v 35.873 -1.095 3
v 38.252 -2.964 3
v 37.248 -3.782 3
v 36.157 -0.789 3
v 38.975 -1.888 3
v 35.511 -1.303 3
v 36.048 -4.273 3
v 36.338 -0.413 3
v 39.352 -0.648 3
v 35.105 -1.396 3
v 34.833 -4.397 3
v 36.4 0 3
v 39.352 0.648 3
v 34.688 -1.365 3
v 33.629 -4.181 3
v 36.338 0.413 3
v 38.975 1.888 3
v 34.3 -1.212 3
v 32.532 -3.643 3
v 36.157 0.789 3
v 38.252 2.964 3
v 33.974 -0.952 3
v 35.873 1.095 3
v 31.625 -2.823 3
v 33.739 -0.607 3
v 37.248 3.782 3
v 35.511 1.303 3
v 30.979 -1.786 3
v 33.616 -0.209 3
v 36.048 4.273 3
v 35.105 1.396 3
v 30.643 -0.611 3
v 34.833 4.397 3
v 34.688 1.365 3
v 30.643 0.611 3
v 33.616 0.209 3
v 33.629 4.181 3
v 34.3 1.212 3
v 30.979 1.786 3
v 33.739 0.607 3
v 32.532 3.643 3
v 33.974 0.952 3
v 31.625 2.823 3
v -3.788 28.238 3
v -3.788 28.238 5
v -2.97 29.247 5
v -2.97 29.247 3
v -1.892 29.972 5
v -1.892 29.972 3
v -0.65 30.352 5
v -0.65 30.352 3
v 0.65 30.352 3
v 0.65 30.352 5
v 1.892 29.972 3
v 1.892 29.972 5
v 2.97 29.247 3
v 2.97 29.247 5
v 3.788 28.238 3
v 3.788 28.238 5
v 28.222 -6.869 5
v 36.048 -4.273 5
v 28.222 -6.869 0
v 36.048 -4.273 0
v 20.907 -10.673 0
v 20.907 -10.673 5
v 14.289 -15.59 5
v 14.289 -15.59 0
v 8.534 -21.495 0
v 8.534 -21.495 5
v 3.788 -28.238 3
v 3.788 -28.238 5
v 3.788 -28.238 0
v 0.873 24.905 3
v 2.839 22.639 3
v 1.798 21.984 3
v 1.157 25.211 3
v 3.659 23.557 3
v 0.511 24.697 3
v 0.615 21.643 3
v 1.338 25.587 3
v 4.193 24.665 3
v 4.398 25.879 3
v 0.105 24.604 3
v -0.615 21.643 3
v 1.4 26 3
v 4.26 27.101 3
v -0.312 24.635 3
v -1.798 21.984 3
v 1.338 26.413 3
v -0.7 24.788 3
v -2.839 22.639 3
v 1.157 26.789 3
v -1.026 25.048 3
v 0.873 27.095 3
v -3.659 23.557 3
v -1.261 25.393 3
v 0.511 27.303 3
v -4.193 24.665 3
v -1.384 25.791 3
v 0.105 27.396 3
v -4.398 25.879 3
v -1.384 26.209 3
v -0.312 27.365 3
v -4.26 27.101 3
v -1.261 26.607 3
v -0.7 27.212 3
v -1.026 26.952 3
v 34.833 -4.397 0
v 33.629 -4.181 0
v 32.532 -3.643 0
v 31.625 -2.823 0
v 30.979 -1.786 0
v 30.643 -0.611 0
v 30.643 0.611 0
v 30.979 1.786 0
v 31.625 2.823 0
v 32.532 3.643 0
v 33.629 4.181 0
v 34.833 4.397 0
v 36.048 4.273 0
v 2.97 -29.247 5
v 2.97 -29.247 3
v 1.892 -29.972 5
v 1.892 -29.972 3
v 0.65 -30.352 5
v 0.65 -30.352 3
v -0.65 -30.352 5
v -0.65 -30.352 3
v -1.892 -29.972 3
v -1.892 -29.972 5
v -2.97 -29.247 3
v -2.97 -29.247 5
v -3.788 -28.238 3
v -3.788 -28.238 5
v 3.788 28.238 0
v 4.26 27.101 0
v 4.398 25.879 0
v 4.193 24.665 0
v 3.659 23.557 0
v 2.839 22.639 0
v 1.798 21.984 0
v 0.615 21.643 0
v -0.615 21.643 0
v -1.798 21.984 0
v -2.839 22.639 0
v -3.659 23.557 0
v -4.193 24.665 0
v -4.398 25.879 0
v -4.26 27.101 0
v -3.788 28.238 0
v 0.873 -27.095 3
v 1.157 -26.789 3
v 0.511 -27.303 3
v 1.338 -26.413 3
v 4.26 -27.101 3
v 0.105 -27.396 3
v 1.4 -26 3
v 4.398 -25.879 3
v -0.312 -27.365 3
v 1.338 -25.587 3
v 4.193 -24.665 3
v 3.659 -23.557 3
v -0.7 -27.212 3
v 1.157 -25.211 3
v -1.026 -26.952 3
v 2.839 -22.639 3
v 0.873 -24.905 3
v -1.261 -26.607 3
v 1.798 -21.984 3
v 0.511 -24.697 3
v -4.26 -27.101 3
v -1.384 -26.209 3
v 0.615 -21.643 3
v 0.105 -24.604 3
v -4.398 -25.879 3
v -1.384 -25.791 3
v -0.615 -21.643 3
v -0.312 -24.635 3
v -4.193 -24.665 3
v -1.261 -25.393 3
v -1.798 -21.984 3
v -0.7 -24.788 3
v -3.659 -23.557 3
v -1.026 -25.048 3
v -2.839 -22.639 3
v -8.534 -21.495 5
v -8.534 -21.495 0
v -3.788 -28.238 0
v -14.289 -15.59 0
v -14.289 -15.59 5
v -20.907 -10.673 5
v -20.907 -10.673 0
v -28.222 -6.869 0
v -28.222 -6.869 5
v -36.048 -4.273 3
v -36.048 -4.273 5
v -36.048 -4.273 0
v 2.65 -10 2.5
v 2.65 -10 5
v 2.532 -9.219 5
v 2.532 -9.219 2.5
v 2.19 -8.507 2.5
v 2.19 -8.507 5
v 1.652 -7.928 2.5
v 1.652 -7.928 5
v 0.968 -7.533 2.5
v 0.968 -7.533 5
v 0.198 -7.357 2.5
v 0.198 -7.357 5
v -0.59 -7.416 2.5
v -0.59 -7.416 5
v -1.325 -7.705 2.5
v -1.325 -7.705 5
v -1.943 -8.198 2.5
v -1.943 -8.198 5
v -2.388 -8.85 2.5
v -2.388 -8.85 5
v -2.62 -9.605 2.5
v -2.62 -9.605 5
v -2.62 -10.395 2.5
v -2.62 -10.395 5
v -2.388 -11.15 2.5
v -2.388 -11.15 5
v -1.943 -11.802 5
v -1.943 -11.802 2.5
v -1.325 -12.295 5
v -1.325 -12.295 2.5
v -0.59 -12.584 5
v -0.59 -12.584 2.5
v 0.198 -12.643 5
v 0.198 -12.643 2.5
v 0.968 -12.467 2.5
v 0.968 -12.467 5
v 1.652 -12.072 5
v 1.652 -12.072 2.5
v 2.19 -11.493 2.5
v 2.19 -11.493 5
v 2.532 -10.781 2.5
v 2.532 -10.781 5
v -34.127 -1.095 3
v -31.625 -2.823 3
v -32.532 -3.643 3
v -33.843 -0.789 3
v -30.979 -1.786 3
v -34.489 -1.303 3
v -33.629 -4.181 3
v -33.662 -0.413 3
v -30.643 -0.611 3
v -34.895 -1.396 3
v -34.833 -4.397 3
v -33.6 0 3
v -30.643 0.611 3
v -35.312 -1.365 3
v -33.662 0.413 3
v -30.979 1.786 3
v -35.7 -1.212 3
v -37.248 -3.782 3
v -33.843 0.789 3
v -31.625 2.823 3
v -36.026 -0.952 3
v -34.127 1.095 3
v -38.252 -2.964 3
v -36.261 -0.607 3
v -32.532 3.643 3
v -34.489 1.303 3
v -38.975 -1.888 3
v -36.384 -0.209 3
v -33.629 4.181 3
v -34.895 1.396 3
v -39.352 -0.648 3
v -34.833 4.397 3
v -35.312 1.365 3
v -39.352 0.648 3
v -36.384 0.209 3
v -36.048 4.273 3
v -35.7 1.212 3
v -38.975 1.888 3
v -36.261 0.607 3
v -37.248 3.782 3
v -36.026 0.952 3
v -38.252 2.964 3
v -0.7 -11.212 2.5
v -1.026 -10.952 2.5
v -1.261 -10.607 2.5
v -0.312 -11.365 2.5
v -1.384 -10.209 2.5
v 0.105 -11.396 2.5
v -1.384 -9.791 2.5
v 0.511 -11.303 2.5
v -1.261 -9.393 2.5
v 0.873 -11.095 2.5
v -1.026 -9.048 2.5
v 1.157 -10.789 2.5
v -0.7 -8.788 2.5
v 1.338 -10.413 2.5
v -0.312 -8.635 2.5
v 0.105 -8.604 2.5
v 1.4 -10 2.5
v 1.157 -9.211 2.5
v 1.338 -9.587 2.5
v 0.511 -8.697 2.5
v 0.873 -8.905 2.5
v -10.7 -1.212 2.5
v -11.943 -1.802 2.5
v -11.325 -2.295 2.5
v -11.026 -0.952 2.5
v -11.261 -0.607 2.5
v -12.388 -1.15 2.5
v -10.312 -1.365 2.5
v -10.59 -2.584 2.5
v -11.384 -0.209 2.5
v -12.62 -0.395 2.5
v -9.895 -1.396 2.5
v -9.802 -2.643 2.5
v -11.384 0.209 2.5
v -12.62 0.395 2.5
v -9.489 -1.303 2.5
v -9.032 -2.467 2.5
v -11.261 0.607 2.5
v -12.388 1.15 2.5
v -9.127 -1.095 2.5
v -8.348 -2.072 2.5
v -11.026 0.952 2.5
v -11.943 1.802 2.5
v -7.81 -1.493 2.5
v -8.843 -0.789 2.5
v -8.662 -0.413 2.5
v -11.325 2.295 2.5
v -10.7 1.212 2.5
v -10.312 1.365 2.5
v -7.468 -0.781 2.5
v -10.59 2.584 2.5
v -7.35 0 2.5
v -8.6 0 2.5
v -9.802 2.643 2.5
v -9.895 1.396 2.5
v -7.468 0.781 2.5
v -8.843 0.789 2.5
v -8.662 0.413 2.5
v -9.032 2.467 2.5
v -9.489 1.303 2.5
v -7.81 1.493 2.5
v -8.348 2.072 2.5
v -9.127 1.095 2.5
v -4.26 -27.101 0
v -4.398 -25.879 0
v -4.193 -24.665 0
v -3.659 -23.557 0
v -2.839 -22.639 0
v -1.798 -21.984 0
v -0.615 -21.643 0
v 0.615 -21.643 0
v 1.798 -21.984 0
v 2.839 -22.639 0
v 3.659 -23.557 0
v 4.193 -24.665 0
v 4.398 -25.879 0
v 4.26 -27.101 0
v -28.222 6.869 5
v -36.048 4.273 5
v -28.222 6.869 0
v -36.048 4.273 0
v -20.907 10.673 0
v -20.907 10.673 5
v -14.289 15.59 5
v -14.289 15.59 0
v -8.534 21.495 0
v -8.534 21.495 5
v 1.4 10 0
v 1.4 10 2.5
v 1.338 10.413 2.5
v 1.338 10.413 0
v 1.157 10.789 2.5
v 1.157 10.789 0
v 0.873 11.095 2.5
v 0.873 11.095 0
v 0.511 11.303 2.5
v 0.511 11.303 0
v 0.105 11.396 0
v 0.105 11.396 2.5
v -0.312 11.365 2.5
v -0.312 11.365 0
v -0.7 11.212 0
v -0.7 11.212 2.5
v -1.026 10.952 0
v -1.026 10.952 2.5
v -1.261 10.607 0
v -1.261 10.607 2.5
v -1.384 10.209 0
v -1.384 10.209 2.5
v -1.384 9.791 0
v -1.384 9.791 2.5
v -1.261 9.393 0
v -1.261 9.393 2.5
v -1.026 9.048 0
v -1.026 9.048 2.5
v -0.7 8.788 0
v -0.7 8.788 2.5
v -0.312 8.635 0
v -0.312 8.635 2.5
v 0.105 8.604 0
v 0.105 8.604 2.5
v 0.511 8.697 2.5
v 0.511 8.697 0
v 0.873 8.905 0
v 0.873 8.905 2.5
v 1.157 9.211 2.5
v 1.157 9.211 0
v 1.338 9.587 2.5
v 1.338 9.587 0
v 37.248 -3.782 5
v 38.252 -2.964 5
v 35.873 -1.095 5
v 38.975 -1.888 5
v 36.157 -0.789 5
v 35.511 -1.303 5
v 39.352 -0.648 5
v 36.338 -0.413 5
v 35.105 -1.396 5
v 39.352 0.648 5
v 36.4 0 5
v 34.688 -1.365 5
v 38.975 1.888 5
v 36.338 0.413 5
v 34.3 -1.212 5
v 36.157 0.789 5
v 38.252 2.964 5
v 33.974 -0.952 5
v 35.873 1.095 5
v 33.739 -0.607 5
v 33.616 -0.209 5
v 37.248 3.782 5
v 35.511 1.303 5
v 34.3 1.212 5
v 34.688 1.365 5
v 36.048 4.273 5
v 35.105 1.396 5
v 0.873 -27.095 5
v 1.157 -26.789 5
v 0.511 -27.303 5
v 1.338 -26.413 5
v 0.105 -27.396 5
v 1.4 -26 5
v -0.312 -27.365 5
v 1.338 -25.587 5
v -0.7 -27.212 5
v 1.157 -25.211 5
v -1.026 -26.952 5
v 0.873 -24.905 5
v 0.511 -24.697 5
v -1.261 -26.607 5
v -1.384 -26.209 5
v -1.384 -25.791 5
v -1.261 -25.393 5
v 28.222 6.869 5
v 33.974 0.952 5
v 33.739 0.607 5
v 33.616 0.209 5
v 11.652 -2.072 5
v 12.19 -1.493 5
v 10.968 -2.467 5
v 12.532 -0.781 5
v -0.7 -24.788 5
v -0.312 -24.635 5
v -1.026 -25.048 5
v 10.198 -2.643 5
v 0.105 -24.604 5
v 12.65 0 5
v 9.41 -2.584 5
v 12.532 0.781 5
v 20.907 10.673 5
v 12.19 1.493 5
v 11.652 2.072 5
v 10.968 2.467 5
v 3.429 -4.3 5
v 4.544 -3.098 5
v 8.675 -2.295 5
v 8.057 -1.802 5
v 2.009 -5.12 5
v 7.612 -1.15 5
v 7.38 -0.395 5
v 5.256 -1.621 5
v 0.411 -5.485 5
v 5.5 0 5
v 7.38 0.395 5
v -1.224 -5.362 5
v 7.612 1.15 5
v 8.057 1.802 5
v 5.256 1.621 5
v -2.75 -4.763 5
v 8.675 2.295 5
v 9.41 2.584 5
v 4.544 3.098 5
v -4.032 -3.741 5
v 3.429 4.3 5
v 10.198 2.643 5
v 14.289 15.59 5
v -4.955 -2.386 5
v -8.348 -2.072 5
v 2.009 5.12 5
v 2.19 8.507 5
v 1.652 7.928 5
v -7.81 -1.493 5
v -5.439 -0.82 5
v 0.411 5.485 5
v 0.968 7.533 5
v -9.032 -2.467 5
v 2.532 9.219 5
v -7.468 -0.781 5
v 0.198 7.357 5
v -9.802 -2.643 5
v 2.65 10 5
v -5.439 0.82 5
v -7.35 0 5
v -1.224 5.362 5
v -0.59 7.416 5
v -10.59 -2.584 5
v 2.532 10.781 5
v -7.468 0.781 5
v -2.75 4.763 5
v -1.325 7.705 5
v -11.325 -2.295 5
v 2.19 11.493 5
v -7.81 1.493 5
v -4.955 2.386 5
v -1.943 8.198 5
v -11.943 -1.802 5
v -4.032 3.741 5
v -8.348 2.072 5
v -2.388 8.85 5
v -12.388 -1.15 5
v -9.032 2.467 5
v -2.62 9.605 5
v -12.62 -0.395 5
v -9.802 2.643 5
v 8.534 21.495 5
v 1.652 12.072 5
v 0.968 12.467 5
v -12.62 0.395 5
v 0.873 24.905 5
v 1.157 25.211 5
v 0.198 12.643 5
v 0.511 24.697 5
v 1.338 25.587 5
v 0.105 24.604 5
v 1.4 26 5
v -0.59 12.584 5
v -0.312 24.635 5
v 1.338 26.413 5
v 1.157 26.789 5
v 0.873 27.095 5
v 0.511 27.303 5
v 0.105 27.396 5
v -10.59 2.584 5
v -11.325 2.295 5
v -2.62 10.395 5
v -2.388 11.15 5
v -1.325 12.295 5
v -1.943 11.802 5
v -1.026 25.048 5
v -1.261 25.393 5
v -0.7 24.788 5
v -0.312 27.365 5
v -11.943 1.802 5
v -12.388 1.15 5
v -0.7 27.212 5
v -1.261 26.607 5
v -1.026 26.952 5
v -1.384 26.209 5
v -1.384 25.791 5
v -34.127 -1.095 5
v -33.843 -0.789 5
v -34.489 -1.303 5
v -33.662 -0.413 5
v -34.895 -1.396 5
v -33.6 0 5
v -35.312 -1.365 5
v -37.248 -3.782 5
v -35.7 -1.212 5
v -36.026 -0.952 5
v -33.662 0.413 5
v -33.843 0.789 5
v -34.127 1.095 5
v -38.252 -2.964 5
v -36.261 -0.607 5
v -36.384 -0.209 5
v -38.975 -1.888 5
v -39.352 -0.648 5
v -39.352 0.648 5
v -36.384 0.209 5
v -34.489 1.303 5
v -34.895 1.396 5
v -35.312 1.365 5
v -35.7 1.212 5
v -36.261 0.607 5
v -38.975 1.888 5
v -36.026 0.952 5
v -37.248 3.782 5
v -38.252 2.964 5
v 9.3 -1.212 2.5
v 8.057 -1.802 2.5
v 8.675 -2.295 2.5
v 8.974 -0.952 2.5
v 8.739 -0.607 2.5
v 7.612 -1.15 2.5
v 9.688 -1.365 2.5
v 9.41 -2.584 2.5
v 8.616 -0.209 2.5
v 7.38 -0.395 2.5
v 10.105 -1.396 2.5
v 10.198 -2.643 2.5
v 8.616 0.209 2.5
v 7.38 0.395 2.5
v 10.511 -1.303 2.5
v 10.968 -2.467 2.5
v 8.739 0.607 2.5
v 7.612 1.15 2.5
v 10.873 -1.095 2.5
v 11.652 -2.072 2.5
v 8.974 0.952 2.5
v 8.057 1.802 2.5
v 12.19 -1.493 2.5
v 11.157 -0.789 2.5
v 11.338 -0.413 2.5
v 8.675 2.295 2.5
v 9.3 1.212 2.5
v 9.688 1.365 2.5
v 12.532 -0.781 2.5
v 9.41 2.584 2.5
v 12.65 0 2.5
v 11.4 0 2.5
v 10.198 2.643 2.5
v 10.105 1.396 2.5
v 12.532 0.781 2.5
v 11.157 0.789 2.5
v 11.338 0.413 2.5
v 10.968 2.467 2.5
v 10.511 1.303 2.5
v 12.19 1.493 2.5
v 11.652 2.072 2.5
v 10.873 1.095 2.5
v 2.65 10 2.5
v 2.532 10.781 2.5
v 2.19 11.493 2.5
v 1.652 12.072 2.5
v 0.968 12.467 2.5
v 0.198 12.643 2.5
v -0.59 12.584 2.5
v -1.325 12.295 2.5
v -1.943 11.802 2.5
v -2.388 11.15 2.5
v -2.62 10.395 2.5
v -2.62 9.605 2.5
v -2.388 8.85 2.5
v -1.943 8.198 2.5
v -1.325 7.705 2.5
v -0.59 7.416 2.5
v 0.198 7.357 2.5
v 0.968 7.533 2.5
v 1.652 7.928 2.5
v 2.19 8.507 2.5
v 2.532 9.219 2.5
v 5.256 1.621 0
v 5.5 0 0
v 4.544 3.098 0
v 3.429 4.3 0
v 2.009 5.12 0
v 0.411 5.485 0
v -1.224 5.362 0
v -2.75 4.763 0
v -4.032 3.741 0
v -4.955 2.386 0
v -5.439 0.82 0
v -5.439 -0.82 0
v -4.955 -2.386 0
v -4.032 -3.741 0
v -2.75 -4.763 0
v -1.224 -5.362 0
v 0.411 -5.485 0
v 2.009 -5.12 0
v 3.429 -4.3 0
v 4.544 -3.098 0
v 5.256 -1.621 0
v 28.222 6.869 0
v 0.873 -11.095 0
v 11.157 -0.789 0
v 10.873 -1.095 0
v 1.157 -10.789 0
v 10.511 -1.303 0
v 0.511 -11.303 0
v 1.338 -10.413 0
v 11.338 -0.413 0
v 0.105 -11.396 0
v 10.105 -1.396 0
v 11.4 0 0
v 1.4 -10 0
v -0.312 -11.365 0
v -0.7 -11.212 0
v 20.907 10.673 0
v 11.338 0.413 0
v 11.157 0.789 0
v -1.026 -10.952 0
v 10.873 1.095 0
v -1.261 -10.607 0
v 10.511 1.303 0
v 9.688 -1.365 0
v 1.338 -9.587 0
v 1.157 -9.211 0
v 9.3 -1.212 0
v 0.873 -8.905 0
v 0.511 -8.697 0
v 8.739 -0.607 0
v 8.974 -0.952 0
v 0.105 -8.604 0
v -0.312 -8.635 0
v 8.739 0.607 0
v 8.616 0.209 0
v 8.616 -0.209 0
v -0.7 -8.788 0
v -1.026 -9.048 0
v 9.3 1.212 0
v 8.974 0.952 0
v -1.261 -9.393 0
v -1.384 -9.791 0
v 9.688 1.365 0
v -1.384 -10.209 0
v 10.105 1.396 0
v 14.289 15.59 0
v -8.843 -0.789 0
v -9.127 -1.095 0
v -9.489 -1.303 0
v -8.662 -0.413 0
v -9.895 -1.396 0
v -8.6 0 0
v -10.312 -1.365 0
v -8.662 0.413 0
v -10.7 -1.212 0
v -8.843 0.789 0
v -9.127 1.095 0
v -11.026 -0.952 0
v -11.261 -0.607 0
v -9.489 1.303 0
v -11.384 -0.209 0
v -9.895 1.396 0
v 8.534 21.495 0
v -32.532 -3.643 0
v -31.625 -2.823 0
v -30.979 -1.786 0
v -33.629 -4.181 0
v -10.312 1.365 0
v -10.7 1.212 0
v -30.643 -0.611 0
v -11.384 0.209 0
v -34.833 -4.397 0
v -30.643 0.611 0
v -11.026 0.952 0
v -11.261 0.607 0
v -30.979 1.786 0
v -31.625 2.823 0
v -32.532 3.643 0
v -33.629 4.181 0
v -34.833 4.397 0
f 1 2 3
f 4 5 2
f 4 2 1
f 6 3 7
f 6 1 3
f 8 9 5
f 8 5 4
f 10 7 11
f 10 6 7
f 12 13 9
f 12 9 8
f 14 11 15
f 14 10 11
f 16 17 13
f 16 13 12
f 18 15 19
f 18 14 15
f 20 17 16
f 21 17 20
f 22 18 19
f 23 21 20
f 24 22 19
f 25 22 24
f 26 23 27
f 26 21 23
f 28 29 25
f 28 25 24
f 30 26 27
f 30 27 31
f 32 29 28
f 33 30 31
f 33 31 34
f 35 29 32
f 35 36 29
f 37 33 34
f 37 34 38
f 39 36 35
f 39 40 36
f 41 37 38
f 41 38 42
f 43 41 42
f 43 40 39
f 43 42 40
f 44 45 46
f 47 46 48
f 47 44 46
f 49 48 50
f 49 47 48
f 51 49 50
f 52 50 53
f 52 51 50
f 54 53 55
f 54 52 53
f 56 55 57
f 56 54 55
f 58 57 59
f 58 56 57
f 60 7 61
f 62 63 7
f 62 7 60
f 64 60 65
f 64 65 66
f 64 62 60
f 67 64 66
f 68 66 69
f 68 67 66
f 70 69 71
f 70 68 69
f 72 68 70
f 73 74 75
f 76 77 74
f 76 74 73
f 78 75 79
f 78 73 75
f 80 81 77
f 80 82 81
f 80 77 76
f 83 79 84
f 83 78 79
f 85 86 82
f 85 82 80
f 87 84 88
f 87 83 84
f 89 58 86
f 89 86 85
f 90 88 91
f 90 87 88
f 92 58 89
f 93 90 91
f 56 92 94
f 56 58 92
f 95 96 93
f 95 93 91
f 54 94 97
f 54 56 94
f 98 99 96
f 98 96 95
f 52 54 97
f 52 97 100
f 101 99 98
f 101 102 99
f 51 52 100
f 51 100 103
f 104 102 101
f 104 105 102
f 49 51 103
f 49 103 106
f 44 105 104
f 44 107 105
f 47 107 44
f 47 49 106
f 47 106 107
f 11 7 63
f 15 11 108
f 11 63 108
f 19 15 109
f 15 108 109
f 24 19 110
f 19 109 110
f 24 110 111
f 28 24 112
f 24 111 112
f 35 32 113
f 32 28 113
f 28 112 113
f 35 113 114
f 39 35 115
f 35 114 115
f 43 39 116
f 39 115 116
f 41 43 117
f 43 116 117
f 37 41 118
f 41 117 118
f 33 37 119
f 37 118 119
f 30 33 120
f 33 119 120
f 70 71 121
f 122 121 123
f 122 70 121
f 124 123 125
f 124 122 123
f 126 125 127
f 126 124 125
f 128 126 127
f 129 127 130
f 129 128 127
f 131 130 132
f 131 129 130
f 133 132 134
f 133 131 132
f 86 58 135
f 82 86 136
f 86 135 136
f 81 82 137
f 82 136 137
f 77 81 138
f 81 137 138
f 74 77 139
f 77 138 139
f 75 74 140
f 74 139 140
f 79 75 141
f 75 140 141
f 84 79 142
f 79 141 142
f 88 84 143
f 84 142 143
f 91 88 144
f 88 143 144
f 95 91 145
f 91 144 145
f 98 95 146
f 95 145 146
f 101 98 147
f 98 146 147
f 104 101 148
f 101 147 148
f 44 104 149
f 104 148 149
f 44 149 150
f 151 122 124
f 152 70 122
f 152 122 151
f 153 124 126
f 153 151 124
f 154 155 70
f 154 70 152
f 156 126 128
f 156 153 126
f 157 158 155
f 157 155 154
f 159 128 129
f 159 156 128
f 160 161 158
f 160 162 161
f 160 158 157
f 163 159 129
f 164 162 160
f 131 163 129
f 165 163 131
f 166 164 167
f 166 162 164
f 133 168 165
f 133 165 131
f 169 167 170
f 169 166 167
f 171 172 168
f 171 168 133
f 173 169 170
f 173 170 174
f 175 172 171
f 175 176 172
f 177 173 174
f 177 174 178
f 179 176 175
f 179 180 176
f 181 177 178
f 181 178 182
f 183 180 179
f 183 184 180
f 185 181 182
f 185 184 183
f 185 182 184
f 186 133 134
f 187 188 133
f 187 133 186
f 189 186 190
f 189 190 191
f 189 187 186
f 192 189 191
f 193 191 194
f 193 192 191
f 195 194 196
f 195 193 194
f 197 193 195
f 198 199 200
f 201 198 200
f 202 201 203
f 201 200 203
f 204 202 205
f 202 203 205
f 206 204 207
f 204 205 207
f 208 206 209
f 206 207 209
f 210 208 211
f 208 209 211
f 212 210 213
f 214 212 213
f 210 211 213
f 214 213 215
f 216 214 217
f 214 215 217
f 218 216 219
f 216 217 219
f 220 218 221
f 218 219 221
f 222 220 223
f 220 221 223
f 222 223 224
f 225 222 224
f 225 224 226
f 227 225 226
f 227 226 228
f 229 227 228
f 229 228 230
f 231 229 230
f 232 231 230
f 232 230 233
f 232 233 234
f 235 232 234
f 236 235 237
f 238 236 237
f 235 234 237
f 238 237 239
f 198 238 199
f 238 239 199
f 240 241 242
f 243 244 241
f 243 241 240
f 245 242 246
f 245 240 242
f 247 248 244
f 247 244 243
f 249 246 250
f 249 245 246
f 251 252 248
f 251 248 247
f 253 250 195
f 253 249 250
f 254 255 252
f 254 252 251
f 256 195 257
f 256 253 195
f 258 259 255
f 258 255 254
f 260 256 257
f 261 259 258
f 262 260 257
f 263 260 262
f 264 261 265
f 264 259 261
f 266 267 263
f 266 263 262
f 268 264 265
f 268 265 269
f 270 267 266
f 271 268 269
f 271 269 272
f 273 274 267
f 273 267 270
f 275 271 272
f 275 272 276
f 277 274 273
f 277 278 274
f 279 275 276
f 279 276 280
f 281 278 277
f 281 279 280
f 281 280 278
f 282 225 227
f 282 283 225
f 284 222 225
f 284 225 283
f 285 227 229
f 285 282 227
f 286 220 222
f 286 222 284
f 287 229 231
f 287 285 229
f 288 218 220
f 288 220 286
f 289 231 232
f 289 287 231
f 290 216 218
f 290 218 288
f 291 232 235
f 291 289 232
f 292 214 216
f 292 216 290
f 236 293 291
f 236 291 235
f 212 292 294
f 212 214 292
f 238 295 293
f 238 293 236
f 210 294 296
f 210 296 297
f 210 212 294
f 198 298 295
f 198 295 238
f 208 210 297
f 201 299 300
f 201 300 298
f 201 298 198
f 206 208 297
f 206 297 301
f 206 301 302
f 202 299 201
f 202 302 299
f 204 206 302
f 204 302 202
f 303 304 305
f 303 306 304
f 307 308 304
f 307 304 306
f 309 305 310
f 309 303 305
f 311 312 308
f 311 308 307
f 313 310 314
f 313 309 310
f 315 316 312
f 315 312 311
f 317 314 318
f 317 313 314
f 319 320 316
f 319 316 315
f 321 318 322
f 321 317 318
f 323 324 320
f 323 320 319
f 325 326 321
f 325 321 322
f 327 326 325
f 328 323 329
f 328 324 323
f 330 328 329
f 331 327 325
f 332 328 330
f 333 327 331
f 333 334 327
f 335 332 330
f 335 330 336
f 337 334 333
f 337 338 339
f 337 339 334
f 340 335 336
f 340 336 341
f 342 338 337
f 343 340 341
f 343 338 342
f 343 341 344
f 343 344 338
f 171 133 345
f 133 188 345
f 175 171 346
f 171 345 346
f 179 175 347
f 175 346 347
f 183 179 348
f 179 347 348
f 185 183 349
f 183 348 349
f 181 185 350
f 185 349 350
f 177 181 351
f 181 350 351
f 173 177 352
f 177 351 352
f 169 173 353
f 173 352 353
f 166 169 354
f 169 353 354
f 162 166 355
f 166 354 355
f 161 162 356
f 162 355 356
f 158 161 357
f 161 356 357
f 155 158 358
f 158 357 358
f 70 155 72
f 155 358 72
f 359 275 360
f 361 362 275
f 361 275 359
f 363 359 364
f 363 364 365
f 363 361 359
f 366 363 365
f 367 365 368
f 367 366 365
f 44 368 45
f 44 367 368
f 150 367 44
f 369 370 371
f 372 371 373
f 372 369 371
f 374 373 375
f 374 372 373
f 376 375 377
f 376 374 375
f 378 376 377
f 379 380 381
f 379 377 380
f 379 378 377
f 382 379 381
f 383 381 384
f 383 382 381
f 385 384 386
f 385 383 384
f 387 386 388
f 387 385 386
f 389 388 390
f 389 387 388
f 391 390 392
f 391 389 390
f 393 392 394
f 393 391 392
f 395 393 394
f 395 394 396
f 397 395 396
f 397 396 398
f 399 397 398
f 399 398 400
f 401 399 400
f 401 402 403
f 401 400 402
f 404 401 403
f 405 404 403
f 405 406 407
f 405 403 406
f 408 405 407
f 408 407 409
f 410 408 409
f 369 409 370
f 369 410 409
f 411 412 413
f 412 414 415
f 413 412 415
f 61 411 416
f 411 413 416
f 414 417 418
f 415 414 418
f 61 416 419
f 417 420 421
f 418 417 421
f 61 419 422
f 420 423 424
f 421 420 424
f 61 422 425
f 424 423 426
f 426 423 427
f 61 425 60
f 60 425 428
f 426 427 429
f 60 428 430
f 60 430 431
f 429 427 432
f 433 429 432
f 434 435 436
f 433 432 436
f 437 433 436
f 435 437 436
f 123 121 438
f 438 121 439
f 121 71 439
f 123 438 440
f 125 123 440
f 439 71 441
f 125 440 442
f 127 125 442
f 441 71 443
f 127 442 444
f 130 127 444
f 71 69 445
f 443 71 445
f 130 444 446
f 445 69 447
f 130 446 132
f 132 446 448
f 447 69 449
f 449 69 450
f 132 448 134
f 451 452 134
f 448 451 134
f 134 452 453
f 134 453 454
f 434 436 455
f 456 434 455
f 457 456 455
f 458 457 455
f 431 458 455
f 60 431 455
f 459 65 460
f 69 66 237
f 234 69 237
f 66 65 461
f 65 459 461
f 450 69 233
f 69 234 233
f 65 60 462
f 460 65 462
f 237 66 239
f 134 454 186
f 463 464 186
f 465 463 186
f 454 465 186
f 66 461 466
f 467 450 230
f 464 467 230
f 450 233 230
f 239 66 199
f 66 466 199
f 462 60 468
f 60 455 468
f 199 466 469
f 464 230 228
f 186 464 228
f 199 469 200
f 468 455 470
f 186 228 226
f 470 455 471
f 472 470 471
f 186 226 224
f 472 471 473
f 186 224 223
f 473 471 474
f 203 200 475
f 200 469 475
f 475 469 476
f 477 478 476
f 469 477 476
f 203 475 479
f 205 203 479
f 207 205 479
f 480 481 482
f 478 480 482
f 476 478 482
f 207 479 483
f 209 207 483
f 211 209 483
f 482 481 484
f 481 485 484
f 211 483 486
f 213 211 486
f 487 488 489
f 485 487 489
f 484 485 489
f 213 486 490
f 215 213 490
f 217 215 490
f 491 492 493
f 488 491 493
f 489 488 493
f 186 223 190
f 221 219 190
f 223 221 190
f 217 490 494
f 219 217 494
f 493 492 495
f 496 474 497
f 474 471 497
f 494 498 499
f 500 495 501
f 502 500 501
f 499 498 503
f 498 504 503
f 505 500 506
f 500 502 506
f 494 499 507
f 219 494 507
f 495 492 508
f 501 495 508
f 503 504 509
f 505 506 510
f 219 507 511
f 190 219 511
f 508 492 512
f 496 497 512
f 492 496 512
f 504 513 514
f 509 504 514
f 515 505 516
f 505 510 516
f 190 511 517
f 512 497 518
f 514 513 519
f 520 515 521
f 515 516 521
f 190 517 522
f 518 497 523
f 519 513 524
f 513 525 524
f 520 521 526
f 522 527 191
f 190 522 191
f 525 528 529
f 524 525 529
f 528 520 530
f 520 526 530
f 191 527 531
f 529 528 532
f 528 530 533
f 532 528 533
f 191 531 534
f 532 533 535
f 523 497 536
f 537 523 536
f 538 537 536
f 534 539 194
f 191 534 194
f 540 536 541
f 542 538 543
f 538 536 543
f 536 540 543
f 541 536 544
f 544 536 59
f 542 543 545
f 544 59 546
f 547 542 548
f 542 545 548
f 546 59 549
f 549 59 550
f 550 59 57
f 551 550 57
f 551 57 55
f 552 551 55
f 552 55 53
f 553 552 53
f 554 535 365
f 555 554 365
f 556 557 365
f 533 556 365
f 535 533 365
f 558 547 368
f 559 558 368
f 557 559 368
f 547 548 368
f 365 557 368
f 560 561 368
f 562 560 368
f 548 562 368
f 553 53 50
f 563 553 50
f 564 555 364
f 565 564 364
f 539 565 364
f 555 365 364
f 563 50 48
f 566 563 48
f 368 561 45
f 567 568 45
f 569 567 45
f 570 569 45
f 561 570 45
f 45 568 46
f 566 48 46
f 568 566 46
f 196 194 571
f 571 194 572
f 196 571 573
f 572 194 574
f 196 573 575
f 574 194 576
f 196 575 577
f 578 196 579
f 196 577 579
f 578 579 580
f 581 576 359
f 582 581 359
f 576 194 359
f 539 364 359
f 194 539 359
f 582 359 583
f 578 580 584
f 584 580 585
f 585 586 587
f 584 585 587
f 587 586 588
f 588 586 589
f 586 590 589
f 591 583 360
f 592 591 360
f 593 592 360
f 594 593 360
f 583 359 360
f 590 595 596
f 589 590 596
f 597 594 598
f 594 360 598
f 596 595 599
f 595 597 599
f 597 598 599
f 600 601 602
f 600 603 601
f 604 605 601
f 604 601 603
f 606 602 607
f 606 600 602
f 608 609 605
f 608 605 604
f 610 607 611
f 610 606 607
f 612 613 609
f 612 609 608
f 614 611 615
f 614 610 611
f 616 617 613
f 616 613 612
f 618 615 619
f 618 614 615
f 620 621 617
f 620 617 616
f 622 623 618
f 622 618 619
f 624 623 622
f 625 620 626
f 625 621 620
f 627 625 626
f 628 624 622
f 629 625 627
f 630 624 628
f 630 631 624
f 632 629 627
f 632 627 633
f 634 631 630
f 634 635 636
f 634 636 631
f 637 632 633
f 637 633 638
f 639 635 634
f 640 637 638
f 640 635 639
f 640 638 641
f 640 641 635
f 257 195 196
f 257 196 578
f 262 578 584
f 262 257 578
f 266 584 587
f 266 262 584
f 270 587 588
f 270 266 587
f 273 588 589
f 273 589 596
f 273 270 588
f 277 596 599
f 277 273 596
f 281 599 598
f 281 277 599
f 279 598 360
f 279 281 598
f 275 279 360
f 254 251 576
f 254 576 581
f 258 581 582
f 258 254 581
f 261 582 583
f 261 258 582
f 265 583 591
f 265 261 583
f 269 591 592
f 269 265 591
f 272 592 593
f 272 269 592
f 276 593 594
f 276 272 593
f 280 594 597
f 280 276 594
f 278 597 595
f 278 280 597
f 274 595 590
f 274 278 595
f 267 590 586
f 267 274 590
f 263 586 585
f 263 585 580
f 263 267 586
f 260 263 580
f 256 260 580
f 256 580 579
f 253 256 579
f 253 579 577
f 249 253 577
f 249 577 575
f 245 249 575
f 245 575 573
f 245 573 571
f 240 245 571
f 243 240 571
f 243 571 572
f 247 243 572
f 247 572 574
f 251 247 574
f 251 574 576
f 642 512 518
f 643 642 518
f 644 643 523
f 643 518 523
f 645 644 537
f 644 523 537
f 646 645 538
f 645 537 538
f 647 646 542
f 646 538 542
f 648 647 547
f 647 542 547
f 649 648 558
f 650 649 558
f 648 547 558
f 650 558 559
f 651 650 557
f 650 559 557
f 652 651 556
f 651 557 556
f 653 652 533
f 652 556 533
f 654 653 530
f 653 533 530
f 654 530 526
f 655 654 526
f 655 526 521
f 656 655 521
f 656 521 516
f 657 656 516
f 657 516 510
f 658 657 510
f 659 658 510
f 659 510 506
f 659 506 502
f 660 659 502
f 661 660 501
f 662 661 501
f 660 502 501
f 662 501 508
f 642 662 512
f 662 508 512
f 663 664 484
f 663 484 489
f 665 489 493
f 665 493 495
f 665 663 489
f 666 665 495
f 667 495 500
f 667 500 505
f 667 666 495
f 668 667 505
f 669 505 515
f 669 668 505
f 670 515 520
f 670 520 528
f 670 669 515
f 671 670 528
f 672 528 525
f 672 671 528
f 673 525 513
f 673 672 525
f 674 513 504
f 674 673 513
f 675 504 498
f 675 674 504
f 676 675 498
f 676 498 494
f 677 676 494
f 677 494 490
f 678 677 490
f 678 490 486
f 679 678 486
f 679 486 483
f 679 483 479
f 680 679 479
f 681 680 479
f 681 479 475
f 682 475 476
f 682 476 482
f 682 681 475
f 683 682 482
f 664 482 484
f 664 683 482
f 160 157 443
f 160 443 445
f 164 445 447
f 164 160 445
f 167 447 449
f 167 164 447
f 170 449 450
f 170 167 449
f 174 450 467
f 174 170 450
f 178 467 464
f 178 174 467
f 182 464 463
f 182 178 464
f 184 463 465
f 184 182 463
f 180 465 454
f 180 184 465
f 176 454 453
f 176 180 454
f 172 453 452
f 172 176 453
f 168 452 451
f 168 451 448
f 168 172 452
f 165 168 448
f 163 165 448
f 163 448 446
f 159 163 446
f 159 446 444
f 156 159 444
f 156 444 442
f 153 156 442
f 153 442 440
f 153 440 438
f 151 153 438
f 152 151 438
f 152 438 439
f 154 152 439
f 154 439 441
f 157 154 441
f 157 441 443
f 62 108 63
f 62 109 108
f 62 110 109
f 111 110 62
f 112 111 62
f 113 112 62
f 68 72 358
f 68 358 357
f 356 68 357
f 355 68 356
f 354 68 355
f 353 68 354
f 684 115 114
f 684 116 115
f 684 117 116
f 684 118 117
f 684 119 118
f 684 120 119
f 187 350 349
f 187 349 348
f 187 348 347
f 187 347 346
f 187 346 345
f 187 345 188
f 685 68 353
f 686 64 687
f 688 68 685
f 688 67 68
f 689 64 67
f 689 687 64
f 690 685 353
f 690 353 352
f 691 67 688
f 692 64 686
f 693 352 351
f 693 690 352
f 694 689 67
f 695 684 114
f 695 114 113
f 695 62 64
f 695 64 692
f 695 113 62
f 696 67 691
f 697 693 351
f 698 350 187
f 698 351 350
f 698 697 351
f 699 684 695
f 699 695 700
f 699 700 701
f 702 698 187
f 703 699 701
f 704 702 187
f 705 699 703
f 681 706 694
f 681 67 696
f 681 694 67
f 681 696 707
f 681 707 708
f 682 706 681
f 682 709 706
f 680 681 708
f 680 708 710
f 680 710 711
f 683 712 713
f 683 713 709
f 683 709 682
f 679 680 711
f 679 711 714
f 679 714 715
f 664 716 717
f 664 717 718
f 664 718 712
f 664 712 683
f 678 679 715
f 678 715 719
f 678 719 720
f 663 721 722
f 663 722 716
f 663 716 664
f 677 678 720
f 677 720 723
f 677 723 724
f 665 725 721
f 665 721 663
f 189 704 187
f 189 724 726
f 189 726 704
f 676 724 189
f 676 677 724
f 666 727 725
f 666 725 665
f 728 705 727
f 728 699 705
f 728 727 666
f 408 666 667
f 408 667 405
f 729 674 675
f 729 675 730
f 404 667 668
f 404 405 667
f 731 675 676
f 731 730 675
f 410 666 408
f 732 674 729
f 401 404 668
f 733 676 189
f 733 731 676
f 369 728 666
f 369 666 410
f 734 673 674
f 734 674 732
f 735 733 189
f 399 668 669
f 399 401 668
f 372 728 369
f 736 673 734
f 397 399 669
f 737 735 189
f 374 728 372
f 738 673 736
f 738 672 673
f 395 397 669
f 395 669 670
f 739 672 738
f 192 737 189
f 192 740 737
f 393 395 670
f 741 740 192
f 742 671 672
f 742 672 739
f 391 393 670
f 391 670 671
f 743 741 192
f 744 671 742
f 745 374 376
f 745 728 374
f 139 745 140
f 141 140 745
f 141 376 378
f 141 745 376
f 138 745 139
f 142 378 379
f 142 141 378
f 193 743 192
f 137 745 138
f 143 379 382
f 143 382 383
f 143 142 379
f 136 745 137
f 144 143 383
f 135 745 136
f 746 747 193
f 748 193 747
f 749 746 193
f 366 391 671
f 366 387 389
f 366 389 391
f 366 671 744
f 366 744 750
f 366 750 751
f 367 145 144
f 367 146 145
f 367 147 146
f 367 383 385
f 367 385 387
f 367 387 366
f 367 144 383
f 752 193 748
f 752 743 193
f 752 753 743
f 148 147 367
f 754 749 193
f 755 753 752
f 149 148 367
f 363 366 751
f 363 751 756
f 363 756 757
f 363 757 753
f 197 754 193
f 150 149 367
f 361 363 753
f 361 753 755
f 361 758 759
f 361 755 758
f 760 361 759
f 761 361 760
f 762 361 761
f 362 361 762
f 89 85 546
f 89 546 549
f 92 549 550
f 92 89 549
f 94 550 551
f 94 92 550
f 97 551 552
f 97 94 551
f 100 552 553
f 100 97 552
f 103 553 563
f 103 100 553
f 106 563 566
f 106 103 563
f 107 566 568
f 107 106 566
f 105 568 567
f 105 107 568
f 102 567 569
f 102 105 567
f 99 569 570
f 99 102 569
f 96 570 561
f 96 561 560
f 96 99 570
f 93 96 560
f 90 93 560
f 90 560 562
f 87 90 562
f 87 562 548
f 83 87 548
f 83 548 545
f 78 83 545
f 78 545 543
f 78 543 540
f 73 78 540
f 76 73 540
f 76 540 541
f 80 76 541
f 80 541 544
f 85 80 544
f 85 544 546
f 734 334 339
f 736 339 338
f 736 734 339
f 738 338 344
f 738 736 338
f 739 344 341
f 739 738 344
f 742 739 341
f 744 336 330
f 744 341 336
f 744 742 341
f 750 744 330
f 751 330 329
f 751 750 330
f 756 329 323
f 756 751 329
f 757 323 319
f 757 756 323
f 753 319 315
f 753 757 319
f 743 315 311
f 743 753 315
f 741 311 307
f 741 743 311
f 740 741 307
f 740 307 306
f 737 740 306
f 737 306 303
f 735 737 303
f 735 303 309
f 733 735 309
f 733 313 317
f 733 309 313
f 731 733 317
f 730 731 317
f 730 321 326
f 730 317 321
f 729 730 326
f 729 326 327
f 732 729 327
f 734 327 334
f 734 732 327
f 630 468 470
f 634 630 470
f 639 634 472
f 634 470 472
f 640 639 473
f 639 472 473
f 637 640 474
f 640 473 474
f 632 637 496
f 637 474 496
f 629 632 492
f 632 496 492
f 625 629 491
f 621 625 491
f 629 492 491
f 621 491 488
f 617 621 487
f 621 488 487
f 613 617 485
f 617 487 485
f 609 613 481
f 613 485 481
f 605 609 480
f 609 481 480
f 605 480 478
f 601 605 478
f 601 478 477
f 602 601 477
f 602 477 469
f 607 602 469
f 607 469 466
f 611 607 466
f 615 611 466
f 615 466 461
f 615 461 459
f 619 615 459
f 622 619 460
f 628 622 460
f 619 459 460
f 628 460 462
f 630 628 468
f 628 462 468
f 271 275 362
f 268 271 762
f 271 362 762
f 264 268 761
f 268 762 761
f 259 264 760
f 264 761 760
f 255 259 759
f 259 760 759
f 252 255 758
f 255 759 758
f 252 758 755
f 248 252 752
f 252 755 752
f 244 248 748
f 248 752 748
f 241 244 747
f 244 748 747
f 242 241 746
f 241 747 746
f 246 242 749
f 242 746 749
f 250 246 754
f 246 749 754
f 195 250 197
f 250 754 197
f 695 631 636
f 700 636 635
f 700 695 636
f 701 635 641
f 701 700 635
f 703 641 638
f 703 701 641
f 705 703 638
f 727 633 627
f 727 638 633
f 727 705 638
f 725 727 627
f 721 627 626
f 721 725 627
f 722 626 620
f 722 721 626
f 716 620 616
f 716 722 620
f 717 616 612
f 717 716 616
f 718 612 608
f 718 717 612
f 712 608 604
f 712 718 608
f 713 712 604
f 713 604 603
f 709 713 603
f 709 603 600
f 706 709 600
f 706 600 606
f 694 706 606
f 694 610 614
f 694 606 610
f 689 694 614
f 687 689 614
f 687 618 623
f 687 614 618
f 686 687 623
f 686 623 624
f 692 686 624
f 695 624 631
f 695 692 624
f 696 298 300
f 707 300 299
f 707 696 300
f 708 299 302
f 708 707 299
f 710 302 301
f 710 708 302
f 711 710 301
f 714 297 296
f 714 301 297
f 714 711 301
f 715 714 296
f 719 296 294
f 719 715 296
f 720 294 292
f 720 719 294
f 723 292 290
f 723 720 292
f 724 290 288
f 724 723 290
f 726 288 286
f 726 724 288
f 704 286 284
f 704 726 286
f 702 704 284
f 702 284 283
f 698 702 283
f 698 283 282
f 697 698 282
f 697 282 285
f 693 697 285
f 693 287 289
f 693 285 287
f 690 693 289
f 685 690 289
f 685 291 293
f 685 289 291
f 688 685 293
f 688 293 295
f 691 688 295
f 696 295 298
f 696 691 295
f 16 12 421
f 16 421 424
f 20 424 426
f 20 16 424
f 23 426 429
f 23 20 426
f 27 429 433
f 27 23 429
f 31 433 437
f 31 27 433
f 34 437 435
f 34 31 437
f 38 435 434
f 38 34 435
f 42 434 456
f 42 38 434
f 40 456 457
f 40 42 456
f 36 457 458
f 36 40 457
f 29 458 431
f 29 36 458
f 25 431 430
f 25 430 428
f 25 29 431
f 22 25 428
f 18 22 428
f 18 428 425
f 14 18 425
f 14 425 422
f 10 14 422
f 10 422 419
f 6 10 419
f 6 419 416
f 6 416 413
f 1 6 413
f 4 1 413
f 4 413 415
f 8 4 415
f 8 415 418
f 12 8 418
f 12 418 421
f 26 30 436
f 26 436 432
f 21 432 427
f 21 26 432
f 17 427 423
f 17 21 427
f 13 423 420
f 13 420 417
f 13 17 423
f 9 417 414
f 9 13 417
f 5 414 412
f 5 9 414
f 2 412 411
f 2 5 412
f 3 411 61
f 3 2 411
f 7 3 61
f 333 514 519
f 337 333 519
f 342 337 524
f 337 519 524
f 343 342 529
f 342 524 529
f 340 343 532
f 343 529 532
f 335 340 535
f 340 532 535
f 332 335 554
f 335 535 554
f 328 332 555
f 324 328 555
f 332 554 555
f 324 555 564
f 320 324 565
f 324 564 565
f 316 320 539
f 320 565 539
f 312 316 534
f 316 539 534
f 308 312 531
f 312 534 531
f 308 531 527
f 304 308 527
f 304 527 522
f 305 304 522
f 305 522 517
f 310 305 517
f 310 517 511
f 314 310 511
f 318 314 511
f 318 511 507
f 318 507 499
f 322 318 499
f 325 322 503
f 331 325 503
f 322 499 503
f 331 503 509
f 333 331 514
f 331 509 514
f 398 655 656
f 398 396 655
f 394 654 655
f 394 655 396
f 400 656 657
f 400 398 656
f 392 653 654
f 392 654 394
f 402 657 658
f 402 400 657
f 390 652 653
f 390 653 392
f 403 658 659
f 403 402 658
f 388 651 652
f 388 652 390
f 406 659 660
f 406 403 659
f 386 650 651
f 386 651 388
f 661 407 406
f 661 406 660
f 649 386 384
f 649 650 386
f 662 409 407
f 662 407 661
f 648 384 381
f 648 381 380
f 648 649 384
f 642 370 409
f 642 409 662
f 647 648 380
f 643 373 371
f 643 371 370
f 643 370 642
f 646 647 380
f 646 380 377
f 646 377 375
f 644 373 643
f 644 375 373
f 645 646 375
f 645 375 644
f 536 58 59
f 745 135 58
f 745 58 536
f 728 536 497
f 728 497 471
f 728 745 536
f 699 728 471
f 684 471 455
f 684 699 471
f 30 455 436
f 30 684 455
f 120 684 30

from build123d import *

# Parameters (mm, degrees)
SKETCH1_R           = 5.5
SKETCH1_R_2         = 1.4
BOSS_EXTRUDE1_DEPTH = 5
SKETCH2_R           = 2.65
CUT_EXTRUDE1_DEPTH  = 2.5
SKETCH3_R           = 4.4
CUT_EXTRUDE2_DEPTH  = 3


with BuildPart() as part:
    # Sketch1 → Boss-Extrude1 (new body)
    with BuildSketch(Plane.XY):
        with BuildLine():
            ThreePointArc((-3.788390561, 28.237877779), (0, 30.4), (3.788390561, 28.237877779))
            ThreePointArc((3.788390561, 28.237877779), (17.5, 13), (36.048454046, 4.273259191))
            ThreePointArc((36.048454046, 4.273259191), (39.4, 0), (36.048454046, -4.273259191))
            ThreePointArc((36.048454046, -4.273259191), (17.5, -13), (3.788390561, -28.237877779))
            ThreePointArc((3.788390561, -28.237877779), (0, -30.4), (-3.788390561, -28.237877779))
            ThreePointArc((-3.788390561, -28.237877779), (-17.5, -13), (-36.048454046, -4.273259191))
            ThreePointArc((-36.048454046, -4.273259191), (-39.4, 0), (-36.048454046, 4.273259191))
            ThreePointArc((-36.048454046, 4.273259191), (-17.5, 13), (-3.788390561, 28.237877779))
        make_face()
        Circle(SKETCH1_R, mode=Mode.SUBTRACT)
        with Locations((0, 10)):
            Circle(SKETCH1_R_2, mode=Mode.SUBTRACT)
        with Locations((10, 0)):
            Circle(SKETCH1_R_2, mode=Mode.SUBTRACT)
        with Locations((0, -10)):
            Circle(SKETCH1_R_2, mode=Mode.SUBTRACT)
        with Locations((-10, 0)):
            Circle(SKETCH1_R_2, mode=Mode.SUBTRACT)
        with Locations((35, 0)):
            Circle(SKETCH1_R_2, mode=Mode.SUBTRACT)
        with Locations((0, 26)):
            Circle(SKETCH1_R_2, mode=Mode.SUBTRACT)
        with Locations((0, -26)):
            Circle(SKETCH1_R_2, mode=Mode.SUBTRACT)
        with Locations((-35, 0)):
            Circle(SKETCH1_R_2, mode=Mode.SUBTRACT)
    extrude(amount=BOSS_EXTRUDE1_DEPTH)

    # Sketch2 → Cut-Extrude1 (cut)
    with BuildSketch(Plane.XY.offset(5)):
        with Locations((0, 10)):
            Circle(SKETCH2_R)
        with Locations((10, 0)):
            Circle(SKETCH2_R)
        with Locations((0, -10)):
            Circle(SKETCH2_R)
        with Locations((-10, 0)):
            Circle(SKETCH2_R)
    extrude(amount=-CUT_EXTRUDE1_DEPTH, mode=Mode.SUBTRACT)

    # Sketch3 → Cut-Extrude2 (cut)
    with BuildSketch(Plane(origin=(0, 0, 0), x_dir=(-1, 0, 0), z_dir=(0, 0, -1))):
        with Locations((0, 26)):
            Circle(SKETCH3_R)
        with Locations((35, 0)):
            Circle(SKETCH3_R)
        with Locations((0, -26)):
            Circle(SKETCH3_R)
        with Locations((-35, 0)):
            Circle(SKETCH3_R)
    extrude(amount=-CUT_EXTRUDE2_DEPTH, mode=Mode.SUBTRACT)


solid = part.part
